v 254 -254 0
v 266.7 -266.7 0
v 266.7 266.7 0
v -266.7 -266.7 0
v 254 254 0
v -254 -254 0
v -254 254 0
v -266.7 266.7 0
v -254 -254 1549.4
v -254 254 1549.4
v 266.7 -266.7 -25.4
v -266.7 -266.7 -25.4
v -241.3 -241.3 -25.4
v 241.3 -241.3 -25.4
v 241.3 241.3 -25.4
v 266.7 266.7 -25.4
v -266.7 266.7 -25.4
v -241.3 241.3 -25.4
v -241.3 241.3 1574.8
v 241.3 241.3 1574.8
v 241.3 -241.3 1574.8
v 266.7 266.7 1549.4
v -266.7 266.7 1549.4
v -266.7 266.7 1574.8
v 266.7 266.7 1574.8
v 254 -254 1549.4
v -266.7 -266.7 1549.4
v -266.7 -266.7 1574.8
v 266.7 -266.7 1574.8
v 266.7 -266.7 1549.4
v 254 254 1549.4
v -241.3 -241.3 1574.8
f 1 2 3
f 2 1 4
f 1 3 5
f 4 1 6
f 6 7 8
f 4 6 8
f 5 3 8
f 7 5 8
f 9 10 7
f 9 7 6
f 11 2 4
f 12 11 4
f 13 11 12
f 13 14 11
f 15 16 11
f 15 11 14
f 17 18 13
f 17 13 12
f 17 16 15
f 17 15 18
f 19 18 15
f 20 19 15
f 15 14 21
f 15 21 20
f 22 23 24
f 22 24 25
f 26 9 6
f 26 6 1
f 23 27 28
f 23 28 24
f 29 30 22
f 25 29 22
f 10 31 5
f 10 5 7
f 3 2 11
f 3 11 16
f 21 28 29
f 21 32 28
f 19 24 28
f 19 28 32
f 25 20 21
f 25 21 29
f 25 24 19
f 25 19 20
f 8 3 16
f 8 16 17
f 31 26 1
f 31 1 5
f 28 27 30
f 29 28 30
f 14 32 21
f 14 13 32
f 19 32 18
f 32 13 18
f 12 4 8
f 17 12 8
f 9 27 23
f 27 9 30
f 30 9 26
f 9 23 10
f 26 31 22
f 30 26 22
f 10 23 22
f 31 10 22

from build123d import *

# Parameters (mm, degrees)
SKETCH5_W           = 533.4
SKETCH5_H           = 533.4
SKETCH5_W_2         = 482.6
SKETCH5_H_2         = 482.6
BOSS_EXTRUDE1_DEPTH = 25.4
SKETCH6_W           = 533.4
SKETCH6_H           = 533.4
SKETCH6_W_2         = 482.6
SKETCH6_H_2         = 482.6
BOSS_EXTRUDE2_DEPTH = 25.4


with BuildPart() as part:
    # Sketch2 → Loft1 section 0
    with BuildSketch(Plane.XY.offset(1549.4)):
        with BuildLine():
            Line((-254, -254), (254, -254))
            Line((254, -254), (254, 254))
            Line((254, 254), (-254, 254))
            Line((-254, 254), (-254, -254))
        make_face()
    # Sketch1 → Loft1 section 1
    with BuildSketch(Plane.XY):
        with BuildLine():
            Line((-254, -254), (254, -254))
            Line((254, -254), (254, 254))
            Line((254, 254), (-254, 254))
            Line((-254, 254), (-254, -254))
        make_face()
    loft()

    # Sketch4 → Cut-Loft1 section 0
    with BuildSketch(Plane(origin=(0, 0, 0), x_dir=(-1, 0, 0), z_dir=(0, 0, -1))):
        with BuildLine():
            Line((-241.3, -241.3), (241.3, -241.3))
            Line((241.3, -241.3), (241.3, 241.3))
            Line((241.3, 241.3), (-241.3, 241.3))
            Line((-241.3, 241.3), (-241.3, -241.3))
        make_face()
    # Sketch3 → Cut-Loft1 section 1
    with BuildSketch(Plane.XY.offset(1549.4)):
        with BuildLine():
            Line((241.3, -241.3), (241.3, 241.3))
            Line((241.3, 241.3), (-241.3, 241.3))
            Line((-241.3, 241.3), (-241.3, -241.3))
            Line((-241.3, -241.3), (241.3, -241.3))
        make_face()
    loft(mode=Mode.SUBTRACT)

    # Sketch5 → Boss-Extrude1 (add)
    with BuildSketch(Plane(origin=(0, 0, 0), x_dir=(-1, 0, 0), z_dir=(0, 0, -1))):
        Rectangle(SKETCH5_W, SKETCH5_H)
        Rectangle(SKETCH5_W_2, SKETCH5_H_2, mode=Mode.SUBTRACT)
    extrude(amount=BOSS_EXTRUDE1_DEPTH)

    # Sketch6 → Boss-Extrude2 (add)
    with BuildSketch(Plane.XY.offset(1549.4)):
        Rectangle(SKETCH6_W, SKETCH6_H)
        Rectangle(SKETCH6_W_2, SKETCH6_H_2, mode=Mode.SUBTRACT)
    extrude(amount=BOSS_EXTRUDE2_DEPTH)


solid = part.part
